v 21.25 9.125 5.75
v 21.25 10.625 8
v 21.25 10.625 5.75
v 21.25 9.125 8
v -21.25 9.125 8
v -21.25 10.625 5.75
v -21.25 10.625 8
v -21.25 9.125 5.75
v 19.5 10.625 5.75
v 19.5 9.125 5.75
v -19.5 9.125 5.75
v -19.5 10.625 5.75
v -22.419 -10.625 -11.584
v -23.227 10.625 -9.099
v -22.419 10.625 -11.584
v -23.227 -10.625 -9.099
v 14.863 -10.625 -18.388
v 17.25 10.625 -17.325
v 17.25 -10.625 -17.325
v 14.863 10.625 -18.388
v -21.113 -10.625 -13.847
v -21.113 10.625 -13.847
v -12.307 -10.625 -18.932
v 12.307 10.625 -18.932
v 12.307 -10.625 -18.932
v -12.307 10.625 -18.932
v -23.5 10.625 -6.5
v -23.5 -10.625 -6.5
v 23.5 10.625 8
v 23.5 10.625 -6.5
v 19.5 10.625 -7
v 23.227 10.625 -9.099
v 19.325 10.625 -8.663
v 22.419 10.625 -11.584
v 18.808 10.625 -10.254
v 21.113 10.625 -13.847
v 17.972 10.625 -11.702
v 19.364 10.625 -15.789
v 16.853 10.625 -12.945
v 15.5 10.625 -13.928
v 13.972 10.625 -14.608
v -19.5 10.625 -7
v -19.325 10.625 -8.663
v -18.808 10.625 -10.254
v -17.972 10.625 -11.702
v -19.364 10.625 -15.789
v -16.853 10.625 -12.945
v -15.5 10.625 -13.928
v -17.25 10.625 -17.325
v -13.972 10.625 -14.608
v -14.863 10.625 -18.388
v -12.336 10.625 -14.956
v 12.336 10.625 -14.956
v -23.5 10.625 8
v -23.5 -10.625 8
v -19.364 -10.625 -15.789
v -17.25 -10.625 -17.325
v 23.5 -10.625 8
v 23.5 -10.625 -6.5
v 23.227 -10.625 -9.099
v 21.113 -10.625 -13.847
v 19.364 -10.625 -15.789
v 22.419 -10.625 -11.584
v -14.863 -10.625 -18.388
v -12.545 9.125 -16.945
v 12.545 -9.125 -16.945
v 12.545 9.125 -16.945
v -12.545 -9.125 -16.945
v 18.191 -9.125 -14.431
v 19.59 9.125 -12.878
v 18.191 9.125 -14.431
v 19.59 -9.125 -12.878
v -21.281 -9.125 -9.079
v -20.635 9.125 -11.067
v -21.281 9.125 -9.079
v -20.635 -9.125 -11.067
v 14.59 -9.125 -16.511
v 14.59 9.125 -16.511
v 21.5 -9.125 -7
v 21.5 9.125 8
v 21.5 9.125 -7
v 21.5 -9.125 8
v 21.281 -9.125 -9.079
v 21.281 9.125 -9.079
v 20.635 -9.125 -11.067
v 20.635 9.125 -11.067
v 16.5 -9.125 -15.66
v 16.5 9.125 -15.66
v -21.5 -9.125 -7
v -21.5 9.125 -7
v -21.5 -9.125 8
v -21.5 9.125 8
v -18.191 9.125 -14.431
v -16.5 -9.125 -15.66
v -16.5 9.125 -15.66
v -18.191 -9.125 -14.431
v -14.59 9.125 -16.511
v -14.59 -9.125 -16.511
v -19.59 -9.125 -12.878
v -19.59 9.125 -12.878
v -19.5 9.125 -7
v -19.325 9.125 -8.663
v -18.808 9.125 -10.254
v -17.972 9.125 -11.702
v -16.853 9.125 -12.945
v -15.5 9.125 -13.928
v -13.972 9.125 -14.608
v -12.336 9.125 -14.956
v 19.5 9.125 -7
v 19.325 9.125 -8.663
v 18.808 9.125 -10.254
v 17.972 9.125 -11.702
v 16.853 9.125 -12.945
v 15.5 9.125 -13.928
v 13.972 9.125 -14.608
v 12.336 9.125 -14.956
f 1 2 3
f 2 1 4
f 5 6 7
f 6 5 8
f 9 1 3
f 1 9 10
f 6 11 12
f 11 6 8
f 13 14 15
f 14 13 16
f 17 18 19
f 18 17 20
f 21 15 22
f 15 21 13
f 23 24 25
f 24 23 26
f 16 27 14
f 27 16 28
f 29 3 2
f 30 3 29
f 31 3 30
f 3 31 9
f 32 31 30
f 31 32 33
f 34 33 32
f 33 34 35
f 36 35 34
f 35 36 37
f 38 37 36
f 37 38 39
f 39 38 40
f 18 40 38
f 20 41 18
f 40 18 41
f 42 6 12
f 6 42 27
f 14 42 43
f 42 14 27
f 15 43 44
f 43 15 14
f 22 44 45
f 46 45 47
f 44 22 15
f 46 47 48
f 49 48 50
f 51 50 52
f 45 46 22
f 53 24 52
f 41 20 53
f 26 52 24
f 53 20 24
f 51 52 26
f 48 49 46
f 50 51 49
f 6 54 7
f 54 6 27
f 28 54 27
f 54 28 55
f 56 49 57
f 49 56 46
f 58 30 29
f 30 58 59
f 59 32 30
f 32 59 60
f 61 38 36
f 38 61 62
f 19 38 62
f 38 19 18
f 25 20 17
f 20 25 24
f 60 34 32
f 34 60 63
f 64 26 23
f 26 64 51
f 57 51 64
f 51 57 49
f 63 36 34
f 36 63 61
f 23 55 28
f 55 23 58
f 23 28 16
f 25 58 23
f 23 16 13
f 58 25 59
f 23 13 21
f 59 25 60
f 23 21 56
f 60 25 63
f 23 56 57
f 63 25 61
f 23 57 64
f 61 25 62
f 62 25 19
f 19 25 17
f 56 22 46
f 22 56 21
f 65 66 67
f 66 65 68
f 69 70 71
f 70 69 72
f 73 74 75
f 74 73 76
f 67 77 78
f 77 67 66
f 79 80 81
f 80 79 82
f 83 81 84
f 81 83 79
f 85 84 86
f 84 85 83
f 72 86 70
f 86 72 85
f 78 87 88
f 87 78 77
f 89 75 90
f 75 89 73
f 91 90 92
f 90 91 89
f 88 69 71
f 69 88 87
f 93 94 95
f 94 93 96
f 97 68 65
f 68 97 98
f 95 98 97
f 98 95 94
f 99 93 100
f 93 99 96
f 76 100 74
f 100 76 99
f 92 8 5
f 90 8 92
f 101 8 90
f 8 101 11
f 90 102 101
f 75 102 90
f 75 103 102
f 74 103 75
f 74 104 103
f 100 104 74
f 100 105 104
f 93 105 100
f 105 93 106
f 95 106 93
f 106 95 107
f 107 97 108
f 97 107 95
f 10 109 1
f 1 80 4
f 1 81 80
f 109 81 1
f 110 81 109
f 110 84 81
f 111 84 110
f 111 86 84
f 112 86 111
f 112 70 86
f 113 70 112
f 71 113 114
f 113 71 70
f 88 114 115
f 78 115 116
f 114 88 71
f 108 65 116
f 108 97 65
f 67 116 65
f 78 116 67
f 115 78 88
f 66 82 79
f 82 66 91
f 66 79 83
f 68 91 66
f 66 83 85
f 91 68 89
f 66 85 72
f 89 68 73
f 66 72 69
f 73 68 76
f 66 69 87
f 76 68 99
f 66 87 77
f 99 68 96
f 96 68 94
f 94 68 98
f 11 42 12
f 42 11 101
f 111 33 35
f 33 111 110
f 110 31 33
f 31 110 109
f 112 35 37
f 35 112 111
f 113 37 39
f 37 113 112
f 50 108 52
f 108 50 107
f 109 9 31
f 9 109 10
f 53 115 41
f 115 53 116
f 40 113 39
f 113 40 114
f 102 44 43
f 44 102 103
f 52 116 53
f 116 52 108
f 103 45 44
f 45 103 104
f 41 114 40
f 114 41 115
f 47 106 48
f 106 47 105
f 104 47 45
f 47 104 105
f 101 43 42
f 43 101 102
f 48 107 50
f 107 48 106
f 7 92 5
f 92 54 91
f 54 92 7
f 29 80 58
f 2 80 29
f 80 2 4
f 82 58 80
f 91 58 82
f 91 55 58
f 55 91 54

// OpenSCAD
$fn=30;
trad=10;
brad=3;

//rotate([0,180,0]) makeheaderadapter();
//rotate([-90,0,0]) makeholddown();
//rotate([-90,0,0]) makefascia();
rotate([0,180,0]) makecover();

module makecover()
{
  color("#0000ff")
  {
    difference()
    {
      translate([0,0,0]) roundedbox(42+5,33+5,18.75+2.5,10+2.5,3);
      translate([0,0,0]) roundedbox(42+1,33+1,18.75+2.5-3,10,3);
      translate([0,10,0]) roundedbox(42-5+2,33-5+2,5,8,3);
      translate([0,0,-33+10.5-2]) cube([100,100,33],center=true);
      intersection()
      {
        translate([0,10,2.25]) roundedbox(42.5,33,18.75,10,3);
        translate([0,10,-16+2.25]) cube([100,100,16],center=true);
      }
    }
  }
}

module makeheaderadapter()
{
  difference()
  {
    roundedbox(42,33,18.75,10,3);
    translate([0,0,-16]) cube([45,14.7,16],center=true);
    translate([0,3.4,-16.5+8]) cube([26,3,6],center=true);
    translate([0,0,33-25+2.5]) cube([45,45,25+8],center=true);
    translate([21-1.5,-1,-6]) cube([3+1,8+1,40],center=true);
    translate([-21+1.5,-1,-6]) cube([3+1,8+1,40],center=true);
  }
}

module makeholddown()
{
  color("#ff0000")
  {
    union()
    {
      difference()
      {
        roundedbox(42,33,18.75,10,3);
        translate([0,0,-33+10.5+0.2]) cube([100,100,33],center=true);
        translate([0,18.75/2,0]) cube([100,3,100],center=true);
        translate([21,-3.5,12.5+3]) cube([56,18.75,33],center=true);
        translate([21-1,-3.5,12.5+3+10]) cube([56,18.75,33],center=true);
        translate([-21,-3.5,12.5+3]) cube([16,18.75,33],center=true);
        translate([0,-5-9.5,12.5+3]) cube([50,18.75,33],center=true);
        translate([0,0,-4.35]) cube([29,50,3],center=true);
        translate([4,-18.75/2,-2]) cube([21,16,3],center=true);
        translate([-4,-18.75/2,-2]) cube([21,8.5,3],center=true);
        translate([-7,8,6.5]) rotate([90,0,0]) cylinder(h=50,r=5,center=true);
        translate([-10,-5,6.5+(13.75/2)]) rotate([90,0,0]) cylinder(h=15,r=1,center=true);
        translate([-10,-5,6.5-(13.75/2)]) rotate([90,0,0]) cylinder(h=15,r=1,center=true);
      }
      translate([21-1.5,-1,-6]) cube([3,8,4],center=true);
      translate([-21+1.5,-1,-6]) cube([3,8,4],center=true);
    }
  }
}

module makefascia()
{
  color("#00ff00")
  {
    difference()
    {
      roundedbox(42-5+2-0.5,33-5+2-0.5,1,8,3);
      translate([0,0,-33+10.5+0.2+0.25]) cube([100,100,33],center=true);
      translate([-7,8,6.5]) rotate([90,0,0]) cylinder(h=50,r=7,center=true);
      difference()
      {
        translate([10.5,8,6.5]) rotate([90,0,0]) cylinder(h=50,r=6,center=true);
        translate([10.5,8,6.5]) cube([3,100,100],center=true);
        translate([10.5,8,6.5]) cube([100,100,3],center=true);
        translate([10.5,8,6.5]) rotate([90,0,0]) cylinder(h=50,r=3.5,center=true);
      }
      translate([10.5,8,6.5]) rotate([90,0,0]) cylinder(h=50,r=2,center=true);
    }
  }
}

module roundedbox(w,h,d,trad,brad)
{
  hull()
  {
    translate([-(w/2)+brad,0,-(h/2)+brad]) rotate([90,0,0]) cylinder(h=d,r=brad,center=true);
    translate([(w/2)-brad,0,-(h/2)+brad]) rotate([90,0,0]) cylinder(h=d,r=brad, center=true);
    translate([(w/2)-trad,0,(h/2)-trad]) rotate([90,0,0]) cylinder(h=d,r=trad,center=true);
    translate([-(w/2)+trad,0,(h/2)-trad]) rotate([90,0,0]) cylinder(h=d,r=trad,center=true);
  }
}
